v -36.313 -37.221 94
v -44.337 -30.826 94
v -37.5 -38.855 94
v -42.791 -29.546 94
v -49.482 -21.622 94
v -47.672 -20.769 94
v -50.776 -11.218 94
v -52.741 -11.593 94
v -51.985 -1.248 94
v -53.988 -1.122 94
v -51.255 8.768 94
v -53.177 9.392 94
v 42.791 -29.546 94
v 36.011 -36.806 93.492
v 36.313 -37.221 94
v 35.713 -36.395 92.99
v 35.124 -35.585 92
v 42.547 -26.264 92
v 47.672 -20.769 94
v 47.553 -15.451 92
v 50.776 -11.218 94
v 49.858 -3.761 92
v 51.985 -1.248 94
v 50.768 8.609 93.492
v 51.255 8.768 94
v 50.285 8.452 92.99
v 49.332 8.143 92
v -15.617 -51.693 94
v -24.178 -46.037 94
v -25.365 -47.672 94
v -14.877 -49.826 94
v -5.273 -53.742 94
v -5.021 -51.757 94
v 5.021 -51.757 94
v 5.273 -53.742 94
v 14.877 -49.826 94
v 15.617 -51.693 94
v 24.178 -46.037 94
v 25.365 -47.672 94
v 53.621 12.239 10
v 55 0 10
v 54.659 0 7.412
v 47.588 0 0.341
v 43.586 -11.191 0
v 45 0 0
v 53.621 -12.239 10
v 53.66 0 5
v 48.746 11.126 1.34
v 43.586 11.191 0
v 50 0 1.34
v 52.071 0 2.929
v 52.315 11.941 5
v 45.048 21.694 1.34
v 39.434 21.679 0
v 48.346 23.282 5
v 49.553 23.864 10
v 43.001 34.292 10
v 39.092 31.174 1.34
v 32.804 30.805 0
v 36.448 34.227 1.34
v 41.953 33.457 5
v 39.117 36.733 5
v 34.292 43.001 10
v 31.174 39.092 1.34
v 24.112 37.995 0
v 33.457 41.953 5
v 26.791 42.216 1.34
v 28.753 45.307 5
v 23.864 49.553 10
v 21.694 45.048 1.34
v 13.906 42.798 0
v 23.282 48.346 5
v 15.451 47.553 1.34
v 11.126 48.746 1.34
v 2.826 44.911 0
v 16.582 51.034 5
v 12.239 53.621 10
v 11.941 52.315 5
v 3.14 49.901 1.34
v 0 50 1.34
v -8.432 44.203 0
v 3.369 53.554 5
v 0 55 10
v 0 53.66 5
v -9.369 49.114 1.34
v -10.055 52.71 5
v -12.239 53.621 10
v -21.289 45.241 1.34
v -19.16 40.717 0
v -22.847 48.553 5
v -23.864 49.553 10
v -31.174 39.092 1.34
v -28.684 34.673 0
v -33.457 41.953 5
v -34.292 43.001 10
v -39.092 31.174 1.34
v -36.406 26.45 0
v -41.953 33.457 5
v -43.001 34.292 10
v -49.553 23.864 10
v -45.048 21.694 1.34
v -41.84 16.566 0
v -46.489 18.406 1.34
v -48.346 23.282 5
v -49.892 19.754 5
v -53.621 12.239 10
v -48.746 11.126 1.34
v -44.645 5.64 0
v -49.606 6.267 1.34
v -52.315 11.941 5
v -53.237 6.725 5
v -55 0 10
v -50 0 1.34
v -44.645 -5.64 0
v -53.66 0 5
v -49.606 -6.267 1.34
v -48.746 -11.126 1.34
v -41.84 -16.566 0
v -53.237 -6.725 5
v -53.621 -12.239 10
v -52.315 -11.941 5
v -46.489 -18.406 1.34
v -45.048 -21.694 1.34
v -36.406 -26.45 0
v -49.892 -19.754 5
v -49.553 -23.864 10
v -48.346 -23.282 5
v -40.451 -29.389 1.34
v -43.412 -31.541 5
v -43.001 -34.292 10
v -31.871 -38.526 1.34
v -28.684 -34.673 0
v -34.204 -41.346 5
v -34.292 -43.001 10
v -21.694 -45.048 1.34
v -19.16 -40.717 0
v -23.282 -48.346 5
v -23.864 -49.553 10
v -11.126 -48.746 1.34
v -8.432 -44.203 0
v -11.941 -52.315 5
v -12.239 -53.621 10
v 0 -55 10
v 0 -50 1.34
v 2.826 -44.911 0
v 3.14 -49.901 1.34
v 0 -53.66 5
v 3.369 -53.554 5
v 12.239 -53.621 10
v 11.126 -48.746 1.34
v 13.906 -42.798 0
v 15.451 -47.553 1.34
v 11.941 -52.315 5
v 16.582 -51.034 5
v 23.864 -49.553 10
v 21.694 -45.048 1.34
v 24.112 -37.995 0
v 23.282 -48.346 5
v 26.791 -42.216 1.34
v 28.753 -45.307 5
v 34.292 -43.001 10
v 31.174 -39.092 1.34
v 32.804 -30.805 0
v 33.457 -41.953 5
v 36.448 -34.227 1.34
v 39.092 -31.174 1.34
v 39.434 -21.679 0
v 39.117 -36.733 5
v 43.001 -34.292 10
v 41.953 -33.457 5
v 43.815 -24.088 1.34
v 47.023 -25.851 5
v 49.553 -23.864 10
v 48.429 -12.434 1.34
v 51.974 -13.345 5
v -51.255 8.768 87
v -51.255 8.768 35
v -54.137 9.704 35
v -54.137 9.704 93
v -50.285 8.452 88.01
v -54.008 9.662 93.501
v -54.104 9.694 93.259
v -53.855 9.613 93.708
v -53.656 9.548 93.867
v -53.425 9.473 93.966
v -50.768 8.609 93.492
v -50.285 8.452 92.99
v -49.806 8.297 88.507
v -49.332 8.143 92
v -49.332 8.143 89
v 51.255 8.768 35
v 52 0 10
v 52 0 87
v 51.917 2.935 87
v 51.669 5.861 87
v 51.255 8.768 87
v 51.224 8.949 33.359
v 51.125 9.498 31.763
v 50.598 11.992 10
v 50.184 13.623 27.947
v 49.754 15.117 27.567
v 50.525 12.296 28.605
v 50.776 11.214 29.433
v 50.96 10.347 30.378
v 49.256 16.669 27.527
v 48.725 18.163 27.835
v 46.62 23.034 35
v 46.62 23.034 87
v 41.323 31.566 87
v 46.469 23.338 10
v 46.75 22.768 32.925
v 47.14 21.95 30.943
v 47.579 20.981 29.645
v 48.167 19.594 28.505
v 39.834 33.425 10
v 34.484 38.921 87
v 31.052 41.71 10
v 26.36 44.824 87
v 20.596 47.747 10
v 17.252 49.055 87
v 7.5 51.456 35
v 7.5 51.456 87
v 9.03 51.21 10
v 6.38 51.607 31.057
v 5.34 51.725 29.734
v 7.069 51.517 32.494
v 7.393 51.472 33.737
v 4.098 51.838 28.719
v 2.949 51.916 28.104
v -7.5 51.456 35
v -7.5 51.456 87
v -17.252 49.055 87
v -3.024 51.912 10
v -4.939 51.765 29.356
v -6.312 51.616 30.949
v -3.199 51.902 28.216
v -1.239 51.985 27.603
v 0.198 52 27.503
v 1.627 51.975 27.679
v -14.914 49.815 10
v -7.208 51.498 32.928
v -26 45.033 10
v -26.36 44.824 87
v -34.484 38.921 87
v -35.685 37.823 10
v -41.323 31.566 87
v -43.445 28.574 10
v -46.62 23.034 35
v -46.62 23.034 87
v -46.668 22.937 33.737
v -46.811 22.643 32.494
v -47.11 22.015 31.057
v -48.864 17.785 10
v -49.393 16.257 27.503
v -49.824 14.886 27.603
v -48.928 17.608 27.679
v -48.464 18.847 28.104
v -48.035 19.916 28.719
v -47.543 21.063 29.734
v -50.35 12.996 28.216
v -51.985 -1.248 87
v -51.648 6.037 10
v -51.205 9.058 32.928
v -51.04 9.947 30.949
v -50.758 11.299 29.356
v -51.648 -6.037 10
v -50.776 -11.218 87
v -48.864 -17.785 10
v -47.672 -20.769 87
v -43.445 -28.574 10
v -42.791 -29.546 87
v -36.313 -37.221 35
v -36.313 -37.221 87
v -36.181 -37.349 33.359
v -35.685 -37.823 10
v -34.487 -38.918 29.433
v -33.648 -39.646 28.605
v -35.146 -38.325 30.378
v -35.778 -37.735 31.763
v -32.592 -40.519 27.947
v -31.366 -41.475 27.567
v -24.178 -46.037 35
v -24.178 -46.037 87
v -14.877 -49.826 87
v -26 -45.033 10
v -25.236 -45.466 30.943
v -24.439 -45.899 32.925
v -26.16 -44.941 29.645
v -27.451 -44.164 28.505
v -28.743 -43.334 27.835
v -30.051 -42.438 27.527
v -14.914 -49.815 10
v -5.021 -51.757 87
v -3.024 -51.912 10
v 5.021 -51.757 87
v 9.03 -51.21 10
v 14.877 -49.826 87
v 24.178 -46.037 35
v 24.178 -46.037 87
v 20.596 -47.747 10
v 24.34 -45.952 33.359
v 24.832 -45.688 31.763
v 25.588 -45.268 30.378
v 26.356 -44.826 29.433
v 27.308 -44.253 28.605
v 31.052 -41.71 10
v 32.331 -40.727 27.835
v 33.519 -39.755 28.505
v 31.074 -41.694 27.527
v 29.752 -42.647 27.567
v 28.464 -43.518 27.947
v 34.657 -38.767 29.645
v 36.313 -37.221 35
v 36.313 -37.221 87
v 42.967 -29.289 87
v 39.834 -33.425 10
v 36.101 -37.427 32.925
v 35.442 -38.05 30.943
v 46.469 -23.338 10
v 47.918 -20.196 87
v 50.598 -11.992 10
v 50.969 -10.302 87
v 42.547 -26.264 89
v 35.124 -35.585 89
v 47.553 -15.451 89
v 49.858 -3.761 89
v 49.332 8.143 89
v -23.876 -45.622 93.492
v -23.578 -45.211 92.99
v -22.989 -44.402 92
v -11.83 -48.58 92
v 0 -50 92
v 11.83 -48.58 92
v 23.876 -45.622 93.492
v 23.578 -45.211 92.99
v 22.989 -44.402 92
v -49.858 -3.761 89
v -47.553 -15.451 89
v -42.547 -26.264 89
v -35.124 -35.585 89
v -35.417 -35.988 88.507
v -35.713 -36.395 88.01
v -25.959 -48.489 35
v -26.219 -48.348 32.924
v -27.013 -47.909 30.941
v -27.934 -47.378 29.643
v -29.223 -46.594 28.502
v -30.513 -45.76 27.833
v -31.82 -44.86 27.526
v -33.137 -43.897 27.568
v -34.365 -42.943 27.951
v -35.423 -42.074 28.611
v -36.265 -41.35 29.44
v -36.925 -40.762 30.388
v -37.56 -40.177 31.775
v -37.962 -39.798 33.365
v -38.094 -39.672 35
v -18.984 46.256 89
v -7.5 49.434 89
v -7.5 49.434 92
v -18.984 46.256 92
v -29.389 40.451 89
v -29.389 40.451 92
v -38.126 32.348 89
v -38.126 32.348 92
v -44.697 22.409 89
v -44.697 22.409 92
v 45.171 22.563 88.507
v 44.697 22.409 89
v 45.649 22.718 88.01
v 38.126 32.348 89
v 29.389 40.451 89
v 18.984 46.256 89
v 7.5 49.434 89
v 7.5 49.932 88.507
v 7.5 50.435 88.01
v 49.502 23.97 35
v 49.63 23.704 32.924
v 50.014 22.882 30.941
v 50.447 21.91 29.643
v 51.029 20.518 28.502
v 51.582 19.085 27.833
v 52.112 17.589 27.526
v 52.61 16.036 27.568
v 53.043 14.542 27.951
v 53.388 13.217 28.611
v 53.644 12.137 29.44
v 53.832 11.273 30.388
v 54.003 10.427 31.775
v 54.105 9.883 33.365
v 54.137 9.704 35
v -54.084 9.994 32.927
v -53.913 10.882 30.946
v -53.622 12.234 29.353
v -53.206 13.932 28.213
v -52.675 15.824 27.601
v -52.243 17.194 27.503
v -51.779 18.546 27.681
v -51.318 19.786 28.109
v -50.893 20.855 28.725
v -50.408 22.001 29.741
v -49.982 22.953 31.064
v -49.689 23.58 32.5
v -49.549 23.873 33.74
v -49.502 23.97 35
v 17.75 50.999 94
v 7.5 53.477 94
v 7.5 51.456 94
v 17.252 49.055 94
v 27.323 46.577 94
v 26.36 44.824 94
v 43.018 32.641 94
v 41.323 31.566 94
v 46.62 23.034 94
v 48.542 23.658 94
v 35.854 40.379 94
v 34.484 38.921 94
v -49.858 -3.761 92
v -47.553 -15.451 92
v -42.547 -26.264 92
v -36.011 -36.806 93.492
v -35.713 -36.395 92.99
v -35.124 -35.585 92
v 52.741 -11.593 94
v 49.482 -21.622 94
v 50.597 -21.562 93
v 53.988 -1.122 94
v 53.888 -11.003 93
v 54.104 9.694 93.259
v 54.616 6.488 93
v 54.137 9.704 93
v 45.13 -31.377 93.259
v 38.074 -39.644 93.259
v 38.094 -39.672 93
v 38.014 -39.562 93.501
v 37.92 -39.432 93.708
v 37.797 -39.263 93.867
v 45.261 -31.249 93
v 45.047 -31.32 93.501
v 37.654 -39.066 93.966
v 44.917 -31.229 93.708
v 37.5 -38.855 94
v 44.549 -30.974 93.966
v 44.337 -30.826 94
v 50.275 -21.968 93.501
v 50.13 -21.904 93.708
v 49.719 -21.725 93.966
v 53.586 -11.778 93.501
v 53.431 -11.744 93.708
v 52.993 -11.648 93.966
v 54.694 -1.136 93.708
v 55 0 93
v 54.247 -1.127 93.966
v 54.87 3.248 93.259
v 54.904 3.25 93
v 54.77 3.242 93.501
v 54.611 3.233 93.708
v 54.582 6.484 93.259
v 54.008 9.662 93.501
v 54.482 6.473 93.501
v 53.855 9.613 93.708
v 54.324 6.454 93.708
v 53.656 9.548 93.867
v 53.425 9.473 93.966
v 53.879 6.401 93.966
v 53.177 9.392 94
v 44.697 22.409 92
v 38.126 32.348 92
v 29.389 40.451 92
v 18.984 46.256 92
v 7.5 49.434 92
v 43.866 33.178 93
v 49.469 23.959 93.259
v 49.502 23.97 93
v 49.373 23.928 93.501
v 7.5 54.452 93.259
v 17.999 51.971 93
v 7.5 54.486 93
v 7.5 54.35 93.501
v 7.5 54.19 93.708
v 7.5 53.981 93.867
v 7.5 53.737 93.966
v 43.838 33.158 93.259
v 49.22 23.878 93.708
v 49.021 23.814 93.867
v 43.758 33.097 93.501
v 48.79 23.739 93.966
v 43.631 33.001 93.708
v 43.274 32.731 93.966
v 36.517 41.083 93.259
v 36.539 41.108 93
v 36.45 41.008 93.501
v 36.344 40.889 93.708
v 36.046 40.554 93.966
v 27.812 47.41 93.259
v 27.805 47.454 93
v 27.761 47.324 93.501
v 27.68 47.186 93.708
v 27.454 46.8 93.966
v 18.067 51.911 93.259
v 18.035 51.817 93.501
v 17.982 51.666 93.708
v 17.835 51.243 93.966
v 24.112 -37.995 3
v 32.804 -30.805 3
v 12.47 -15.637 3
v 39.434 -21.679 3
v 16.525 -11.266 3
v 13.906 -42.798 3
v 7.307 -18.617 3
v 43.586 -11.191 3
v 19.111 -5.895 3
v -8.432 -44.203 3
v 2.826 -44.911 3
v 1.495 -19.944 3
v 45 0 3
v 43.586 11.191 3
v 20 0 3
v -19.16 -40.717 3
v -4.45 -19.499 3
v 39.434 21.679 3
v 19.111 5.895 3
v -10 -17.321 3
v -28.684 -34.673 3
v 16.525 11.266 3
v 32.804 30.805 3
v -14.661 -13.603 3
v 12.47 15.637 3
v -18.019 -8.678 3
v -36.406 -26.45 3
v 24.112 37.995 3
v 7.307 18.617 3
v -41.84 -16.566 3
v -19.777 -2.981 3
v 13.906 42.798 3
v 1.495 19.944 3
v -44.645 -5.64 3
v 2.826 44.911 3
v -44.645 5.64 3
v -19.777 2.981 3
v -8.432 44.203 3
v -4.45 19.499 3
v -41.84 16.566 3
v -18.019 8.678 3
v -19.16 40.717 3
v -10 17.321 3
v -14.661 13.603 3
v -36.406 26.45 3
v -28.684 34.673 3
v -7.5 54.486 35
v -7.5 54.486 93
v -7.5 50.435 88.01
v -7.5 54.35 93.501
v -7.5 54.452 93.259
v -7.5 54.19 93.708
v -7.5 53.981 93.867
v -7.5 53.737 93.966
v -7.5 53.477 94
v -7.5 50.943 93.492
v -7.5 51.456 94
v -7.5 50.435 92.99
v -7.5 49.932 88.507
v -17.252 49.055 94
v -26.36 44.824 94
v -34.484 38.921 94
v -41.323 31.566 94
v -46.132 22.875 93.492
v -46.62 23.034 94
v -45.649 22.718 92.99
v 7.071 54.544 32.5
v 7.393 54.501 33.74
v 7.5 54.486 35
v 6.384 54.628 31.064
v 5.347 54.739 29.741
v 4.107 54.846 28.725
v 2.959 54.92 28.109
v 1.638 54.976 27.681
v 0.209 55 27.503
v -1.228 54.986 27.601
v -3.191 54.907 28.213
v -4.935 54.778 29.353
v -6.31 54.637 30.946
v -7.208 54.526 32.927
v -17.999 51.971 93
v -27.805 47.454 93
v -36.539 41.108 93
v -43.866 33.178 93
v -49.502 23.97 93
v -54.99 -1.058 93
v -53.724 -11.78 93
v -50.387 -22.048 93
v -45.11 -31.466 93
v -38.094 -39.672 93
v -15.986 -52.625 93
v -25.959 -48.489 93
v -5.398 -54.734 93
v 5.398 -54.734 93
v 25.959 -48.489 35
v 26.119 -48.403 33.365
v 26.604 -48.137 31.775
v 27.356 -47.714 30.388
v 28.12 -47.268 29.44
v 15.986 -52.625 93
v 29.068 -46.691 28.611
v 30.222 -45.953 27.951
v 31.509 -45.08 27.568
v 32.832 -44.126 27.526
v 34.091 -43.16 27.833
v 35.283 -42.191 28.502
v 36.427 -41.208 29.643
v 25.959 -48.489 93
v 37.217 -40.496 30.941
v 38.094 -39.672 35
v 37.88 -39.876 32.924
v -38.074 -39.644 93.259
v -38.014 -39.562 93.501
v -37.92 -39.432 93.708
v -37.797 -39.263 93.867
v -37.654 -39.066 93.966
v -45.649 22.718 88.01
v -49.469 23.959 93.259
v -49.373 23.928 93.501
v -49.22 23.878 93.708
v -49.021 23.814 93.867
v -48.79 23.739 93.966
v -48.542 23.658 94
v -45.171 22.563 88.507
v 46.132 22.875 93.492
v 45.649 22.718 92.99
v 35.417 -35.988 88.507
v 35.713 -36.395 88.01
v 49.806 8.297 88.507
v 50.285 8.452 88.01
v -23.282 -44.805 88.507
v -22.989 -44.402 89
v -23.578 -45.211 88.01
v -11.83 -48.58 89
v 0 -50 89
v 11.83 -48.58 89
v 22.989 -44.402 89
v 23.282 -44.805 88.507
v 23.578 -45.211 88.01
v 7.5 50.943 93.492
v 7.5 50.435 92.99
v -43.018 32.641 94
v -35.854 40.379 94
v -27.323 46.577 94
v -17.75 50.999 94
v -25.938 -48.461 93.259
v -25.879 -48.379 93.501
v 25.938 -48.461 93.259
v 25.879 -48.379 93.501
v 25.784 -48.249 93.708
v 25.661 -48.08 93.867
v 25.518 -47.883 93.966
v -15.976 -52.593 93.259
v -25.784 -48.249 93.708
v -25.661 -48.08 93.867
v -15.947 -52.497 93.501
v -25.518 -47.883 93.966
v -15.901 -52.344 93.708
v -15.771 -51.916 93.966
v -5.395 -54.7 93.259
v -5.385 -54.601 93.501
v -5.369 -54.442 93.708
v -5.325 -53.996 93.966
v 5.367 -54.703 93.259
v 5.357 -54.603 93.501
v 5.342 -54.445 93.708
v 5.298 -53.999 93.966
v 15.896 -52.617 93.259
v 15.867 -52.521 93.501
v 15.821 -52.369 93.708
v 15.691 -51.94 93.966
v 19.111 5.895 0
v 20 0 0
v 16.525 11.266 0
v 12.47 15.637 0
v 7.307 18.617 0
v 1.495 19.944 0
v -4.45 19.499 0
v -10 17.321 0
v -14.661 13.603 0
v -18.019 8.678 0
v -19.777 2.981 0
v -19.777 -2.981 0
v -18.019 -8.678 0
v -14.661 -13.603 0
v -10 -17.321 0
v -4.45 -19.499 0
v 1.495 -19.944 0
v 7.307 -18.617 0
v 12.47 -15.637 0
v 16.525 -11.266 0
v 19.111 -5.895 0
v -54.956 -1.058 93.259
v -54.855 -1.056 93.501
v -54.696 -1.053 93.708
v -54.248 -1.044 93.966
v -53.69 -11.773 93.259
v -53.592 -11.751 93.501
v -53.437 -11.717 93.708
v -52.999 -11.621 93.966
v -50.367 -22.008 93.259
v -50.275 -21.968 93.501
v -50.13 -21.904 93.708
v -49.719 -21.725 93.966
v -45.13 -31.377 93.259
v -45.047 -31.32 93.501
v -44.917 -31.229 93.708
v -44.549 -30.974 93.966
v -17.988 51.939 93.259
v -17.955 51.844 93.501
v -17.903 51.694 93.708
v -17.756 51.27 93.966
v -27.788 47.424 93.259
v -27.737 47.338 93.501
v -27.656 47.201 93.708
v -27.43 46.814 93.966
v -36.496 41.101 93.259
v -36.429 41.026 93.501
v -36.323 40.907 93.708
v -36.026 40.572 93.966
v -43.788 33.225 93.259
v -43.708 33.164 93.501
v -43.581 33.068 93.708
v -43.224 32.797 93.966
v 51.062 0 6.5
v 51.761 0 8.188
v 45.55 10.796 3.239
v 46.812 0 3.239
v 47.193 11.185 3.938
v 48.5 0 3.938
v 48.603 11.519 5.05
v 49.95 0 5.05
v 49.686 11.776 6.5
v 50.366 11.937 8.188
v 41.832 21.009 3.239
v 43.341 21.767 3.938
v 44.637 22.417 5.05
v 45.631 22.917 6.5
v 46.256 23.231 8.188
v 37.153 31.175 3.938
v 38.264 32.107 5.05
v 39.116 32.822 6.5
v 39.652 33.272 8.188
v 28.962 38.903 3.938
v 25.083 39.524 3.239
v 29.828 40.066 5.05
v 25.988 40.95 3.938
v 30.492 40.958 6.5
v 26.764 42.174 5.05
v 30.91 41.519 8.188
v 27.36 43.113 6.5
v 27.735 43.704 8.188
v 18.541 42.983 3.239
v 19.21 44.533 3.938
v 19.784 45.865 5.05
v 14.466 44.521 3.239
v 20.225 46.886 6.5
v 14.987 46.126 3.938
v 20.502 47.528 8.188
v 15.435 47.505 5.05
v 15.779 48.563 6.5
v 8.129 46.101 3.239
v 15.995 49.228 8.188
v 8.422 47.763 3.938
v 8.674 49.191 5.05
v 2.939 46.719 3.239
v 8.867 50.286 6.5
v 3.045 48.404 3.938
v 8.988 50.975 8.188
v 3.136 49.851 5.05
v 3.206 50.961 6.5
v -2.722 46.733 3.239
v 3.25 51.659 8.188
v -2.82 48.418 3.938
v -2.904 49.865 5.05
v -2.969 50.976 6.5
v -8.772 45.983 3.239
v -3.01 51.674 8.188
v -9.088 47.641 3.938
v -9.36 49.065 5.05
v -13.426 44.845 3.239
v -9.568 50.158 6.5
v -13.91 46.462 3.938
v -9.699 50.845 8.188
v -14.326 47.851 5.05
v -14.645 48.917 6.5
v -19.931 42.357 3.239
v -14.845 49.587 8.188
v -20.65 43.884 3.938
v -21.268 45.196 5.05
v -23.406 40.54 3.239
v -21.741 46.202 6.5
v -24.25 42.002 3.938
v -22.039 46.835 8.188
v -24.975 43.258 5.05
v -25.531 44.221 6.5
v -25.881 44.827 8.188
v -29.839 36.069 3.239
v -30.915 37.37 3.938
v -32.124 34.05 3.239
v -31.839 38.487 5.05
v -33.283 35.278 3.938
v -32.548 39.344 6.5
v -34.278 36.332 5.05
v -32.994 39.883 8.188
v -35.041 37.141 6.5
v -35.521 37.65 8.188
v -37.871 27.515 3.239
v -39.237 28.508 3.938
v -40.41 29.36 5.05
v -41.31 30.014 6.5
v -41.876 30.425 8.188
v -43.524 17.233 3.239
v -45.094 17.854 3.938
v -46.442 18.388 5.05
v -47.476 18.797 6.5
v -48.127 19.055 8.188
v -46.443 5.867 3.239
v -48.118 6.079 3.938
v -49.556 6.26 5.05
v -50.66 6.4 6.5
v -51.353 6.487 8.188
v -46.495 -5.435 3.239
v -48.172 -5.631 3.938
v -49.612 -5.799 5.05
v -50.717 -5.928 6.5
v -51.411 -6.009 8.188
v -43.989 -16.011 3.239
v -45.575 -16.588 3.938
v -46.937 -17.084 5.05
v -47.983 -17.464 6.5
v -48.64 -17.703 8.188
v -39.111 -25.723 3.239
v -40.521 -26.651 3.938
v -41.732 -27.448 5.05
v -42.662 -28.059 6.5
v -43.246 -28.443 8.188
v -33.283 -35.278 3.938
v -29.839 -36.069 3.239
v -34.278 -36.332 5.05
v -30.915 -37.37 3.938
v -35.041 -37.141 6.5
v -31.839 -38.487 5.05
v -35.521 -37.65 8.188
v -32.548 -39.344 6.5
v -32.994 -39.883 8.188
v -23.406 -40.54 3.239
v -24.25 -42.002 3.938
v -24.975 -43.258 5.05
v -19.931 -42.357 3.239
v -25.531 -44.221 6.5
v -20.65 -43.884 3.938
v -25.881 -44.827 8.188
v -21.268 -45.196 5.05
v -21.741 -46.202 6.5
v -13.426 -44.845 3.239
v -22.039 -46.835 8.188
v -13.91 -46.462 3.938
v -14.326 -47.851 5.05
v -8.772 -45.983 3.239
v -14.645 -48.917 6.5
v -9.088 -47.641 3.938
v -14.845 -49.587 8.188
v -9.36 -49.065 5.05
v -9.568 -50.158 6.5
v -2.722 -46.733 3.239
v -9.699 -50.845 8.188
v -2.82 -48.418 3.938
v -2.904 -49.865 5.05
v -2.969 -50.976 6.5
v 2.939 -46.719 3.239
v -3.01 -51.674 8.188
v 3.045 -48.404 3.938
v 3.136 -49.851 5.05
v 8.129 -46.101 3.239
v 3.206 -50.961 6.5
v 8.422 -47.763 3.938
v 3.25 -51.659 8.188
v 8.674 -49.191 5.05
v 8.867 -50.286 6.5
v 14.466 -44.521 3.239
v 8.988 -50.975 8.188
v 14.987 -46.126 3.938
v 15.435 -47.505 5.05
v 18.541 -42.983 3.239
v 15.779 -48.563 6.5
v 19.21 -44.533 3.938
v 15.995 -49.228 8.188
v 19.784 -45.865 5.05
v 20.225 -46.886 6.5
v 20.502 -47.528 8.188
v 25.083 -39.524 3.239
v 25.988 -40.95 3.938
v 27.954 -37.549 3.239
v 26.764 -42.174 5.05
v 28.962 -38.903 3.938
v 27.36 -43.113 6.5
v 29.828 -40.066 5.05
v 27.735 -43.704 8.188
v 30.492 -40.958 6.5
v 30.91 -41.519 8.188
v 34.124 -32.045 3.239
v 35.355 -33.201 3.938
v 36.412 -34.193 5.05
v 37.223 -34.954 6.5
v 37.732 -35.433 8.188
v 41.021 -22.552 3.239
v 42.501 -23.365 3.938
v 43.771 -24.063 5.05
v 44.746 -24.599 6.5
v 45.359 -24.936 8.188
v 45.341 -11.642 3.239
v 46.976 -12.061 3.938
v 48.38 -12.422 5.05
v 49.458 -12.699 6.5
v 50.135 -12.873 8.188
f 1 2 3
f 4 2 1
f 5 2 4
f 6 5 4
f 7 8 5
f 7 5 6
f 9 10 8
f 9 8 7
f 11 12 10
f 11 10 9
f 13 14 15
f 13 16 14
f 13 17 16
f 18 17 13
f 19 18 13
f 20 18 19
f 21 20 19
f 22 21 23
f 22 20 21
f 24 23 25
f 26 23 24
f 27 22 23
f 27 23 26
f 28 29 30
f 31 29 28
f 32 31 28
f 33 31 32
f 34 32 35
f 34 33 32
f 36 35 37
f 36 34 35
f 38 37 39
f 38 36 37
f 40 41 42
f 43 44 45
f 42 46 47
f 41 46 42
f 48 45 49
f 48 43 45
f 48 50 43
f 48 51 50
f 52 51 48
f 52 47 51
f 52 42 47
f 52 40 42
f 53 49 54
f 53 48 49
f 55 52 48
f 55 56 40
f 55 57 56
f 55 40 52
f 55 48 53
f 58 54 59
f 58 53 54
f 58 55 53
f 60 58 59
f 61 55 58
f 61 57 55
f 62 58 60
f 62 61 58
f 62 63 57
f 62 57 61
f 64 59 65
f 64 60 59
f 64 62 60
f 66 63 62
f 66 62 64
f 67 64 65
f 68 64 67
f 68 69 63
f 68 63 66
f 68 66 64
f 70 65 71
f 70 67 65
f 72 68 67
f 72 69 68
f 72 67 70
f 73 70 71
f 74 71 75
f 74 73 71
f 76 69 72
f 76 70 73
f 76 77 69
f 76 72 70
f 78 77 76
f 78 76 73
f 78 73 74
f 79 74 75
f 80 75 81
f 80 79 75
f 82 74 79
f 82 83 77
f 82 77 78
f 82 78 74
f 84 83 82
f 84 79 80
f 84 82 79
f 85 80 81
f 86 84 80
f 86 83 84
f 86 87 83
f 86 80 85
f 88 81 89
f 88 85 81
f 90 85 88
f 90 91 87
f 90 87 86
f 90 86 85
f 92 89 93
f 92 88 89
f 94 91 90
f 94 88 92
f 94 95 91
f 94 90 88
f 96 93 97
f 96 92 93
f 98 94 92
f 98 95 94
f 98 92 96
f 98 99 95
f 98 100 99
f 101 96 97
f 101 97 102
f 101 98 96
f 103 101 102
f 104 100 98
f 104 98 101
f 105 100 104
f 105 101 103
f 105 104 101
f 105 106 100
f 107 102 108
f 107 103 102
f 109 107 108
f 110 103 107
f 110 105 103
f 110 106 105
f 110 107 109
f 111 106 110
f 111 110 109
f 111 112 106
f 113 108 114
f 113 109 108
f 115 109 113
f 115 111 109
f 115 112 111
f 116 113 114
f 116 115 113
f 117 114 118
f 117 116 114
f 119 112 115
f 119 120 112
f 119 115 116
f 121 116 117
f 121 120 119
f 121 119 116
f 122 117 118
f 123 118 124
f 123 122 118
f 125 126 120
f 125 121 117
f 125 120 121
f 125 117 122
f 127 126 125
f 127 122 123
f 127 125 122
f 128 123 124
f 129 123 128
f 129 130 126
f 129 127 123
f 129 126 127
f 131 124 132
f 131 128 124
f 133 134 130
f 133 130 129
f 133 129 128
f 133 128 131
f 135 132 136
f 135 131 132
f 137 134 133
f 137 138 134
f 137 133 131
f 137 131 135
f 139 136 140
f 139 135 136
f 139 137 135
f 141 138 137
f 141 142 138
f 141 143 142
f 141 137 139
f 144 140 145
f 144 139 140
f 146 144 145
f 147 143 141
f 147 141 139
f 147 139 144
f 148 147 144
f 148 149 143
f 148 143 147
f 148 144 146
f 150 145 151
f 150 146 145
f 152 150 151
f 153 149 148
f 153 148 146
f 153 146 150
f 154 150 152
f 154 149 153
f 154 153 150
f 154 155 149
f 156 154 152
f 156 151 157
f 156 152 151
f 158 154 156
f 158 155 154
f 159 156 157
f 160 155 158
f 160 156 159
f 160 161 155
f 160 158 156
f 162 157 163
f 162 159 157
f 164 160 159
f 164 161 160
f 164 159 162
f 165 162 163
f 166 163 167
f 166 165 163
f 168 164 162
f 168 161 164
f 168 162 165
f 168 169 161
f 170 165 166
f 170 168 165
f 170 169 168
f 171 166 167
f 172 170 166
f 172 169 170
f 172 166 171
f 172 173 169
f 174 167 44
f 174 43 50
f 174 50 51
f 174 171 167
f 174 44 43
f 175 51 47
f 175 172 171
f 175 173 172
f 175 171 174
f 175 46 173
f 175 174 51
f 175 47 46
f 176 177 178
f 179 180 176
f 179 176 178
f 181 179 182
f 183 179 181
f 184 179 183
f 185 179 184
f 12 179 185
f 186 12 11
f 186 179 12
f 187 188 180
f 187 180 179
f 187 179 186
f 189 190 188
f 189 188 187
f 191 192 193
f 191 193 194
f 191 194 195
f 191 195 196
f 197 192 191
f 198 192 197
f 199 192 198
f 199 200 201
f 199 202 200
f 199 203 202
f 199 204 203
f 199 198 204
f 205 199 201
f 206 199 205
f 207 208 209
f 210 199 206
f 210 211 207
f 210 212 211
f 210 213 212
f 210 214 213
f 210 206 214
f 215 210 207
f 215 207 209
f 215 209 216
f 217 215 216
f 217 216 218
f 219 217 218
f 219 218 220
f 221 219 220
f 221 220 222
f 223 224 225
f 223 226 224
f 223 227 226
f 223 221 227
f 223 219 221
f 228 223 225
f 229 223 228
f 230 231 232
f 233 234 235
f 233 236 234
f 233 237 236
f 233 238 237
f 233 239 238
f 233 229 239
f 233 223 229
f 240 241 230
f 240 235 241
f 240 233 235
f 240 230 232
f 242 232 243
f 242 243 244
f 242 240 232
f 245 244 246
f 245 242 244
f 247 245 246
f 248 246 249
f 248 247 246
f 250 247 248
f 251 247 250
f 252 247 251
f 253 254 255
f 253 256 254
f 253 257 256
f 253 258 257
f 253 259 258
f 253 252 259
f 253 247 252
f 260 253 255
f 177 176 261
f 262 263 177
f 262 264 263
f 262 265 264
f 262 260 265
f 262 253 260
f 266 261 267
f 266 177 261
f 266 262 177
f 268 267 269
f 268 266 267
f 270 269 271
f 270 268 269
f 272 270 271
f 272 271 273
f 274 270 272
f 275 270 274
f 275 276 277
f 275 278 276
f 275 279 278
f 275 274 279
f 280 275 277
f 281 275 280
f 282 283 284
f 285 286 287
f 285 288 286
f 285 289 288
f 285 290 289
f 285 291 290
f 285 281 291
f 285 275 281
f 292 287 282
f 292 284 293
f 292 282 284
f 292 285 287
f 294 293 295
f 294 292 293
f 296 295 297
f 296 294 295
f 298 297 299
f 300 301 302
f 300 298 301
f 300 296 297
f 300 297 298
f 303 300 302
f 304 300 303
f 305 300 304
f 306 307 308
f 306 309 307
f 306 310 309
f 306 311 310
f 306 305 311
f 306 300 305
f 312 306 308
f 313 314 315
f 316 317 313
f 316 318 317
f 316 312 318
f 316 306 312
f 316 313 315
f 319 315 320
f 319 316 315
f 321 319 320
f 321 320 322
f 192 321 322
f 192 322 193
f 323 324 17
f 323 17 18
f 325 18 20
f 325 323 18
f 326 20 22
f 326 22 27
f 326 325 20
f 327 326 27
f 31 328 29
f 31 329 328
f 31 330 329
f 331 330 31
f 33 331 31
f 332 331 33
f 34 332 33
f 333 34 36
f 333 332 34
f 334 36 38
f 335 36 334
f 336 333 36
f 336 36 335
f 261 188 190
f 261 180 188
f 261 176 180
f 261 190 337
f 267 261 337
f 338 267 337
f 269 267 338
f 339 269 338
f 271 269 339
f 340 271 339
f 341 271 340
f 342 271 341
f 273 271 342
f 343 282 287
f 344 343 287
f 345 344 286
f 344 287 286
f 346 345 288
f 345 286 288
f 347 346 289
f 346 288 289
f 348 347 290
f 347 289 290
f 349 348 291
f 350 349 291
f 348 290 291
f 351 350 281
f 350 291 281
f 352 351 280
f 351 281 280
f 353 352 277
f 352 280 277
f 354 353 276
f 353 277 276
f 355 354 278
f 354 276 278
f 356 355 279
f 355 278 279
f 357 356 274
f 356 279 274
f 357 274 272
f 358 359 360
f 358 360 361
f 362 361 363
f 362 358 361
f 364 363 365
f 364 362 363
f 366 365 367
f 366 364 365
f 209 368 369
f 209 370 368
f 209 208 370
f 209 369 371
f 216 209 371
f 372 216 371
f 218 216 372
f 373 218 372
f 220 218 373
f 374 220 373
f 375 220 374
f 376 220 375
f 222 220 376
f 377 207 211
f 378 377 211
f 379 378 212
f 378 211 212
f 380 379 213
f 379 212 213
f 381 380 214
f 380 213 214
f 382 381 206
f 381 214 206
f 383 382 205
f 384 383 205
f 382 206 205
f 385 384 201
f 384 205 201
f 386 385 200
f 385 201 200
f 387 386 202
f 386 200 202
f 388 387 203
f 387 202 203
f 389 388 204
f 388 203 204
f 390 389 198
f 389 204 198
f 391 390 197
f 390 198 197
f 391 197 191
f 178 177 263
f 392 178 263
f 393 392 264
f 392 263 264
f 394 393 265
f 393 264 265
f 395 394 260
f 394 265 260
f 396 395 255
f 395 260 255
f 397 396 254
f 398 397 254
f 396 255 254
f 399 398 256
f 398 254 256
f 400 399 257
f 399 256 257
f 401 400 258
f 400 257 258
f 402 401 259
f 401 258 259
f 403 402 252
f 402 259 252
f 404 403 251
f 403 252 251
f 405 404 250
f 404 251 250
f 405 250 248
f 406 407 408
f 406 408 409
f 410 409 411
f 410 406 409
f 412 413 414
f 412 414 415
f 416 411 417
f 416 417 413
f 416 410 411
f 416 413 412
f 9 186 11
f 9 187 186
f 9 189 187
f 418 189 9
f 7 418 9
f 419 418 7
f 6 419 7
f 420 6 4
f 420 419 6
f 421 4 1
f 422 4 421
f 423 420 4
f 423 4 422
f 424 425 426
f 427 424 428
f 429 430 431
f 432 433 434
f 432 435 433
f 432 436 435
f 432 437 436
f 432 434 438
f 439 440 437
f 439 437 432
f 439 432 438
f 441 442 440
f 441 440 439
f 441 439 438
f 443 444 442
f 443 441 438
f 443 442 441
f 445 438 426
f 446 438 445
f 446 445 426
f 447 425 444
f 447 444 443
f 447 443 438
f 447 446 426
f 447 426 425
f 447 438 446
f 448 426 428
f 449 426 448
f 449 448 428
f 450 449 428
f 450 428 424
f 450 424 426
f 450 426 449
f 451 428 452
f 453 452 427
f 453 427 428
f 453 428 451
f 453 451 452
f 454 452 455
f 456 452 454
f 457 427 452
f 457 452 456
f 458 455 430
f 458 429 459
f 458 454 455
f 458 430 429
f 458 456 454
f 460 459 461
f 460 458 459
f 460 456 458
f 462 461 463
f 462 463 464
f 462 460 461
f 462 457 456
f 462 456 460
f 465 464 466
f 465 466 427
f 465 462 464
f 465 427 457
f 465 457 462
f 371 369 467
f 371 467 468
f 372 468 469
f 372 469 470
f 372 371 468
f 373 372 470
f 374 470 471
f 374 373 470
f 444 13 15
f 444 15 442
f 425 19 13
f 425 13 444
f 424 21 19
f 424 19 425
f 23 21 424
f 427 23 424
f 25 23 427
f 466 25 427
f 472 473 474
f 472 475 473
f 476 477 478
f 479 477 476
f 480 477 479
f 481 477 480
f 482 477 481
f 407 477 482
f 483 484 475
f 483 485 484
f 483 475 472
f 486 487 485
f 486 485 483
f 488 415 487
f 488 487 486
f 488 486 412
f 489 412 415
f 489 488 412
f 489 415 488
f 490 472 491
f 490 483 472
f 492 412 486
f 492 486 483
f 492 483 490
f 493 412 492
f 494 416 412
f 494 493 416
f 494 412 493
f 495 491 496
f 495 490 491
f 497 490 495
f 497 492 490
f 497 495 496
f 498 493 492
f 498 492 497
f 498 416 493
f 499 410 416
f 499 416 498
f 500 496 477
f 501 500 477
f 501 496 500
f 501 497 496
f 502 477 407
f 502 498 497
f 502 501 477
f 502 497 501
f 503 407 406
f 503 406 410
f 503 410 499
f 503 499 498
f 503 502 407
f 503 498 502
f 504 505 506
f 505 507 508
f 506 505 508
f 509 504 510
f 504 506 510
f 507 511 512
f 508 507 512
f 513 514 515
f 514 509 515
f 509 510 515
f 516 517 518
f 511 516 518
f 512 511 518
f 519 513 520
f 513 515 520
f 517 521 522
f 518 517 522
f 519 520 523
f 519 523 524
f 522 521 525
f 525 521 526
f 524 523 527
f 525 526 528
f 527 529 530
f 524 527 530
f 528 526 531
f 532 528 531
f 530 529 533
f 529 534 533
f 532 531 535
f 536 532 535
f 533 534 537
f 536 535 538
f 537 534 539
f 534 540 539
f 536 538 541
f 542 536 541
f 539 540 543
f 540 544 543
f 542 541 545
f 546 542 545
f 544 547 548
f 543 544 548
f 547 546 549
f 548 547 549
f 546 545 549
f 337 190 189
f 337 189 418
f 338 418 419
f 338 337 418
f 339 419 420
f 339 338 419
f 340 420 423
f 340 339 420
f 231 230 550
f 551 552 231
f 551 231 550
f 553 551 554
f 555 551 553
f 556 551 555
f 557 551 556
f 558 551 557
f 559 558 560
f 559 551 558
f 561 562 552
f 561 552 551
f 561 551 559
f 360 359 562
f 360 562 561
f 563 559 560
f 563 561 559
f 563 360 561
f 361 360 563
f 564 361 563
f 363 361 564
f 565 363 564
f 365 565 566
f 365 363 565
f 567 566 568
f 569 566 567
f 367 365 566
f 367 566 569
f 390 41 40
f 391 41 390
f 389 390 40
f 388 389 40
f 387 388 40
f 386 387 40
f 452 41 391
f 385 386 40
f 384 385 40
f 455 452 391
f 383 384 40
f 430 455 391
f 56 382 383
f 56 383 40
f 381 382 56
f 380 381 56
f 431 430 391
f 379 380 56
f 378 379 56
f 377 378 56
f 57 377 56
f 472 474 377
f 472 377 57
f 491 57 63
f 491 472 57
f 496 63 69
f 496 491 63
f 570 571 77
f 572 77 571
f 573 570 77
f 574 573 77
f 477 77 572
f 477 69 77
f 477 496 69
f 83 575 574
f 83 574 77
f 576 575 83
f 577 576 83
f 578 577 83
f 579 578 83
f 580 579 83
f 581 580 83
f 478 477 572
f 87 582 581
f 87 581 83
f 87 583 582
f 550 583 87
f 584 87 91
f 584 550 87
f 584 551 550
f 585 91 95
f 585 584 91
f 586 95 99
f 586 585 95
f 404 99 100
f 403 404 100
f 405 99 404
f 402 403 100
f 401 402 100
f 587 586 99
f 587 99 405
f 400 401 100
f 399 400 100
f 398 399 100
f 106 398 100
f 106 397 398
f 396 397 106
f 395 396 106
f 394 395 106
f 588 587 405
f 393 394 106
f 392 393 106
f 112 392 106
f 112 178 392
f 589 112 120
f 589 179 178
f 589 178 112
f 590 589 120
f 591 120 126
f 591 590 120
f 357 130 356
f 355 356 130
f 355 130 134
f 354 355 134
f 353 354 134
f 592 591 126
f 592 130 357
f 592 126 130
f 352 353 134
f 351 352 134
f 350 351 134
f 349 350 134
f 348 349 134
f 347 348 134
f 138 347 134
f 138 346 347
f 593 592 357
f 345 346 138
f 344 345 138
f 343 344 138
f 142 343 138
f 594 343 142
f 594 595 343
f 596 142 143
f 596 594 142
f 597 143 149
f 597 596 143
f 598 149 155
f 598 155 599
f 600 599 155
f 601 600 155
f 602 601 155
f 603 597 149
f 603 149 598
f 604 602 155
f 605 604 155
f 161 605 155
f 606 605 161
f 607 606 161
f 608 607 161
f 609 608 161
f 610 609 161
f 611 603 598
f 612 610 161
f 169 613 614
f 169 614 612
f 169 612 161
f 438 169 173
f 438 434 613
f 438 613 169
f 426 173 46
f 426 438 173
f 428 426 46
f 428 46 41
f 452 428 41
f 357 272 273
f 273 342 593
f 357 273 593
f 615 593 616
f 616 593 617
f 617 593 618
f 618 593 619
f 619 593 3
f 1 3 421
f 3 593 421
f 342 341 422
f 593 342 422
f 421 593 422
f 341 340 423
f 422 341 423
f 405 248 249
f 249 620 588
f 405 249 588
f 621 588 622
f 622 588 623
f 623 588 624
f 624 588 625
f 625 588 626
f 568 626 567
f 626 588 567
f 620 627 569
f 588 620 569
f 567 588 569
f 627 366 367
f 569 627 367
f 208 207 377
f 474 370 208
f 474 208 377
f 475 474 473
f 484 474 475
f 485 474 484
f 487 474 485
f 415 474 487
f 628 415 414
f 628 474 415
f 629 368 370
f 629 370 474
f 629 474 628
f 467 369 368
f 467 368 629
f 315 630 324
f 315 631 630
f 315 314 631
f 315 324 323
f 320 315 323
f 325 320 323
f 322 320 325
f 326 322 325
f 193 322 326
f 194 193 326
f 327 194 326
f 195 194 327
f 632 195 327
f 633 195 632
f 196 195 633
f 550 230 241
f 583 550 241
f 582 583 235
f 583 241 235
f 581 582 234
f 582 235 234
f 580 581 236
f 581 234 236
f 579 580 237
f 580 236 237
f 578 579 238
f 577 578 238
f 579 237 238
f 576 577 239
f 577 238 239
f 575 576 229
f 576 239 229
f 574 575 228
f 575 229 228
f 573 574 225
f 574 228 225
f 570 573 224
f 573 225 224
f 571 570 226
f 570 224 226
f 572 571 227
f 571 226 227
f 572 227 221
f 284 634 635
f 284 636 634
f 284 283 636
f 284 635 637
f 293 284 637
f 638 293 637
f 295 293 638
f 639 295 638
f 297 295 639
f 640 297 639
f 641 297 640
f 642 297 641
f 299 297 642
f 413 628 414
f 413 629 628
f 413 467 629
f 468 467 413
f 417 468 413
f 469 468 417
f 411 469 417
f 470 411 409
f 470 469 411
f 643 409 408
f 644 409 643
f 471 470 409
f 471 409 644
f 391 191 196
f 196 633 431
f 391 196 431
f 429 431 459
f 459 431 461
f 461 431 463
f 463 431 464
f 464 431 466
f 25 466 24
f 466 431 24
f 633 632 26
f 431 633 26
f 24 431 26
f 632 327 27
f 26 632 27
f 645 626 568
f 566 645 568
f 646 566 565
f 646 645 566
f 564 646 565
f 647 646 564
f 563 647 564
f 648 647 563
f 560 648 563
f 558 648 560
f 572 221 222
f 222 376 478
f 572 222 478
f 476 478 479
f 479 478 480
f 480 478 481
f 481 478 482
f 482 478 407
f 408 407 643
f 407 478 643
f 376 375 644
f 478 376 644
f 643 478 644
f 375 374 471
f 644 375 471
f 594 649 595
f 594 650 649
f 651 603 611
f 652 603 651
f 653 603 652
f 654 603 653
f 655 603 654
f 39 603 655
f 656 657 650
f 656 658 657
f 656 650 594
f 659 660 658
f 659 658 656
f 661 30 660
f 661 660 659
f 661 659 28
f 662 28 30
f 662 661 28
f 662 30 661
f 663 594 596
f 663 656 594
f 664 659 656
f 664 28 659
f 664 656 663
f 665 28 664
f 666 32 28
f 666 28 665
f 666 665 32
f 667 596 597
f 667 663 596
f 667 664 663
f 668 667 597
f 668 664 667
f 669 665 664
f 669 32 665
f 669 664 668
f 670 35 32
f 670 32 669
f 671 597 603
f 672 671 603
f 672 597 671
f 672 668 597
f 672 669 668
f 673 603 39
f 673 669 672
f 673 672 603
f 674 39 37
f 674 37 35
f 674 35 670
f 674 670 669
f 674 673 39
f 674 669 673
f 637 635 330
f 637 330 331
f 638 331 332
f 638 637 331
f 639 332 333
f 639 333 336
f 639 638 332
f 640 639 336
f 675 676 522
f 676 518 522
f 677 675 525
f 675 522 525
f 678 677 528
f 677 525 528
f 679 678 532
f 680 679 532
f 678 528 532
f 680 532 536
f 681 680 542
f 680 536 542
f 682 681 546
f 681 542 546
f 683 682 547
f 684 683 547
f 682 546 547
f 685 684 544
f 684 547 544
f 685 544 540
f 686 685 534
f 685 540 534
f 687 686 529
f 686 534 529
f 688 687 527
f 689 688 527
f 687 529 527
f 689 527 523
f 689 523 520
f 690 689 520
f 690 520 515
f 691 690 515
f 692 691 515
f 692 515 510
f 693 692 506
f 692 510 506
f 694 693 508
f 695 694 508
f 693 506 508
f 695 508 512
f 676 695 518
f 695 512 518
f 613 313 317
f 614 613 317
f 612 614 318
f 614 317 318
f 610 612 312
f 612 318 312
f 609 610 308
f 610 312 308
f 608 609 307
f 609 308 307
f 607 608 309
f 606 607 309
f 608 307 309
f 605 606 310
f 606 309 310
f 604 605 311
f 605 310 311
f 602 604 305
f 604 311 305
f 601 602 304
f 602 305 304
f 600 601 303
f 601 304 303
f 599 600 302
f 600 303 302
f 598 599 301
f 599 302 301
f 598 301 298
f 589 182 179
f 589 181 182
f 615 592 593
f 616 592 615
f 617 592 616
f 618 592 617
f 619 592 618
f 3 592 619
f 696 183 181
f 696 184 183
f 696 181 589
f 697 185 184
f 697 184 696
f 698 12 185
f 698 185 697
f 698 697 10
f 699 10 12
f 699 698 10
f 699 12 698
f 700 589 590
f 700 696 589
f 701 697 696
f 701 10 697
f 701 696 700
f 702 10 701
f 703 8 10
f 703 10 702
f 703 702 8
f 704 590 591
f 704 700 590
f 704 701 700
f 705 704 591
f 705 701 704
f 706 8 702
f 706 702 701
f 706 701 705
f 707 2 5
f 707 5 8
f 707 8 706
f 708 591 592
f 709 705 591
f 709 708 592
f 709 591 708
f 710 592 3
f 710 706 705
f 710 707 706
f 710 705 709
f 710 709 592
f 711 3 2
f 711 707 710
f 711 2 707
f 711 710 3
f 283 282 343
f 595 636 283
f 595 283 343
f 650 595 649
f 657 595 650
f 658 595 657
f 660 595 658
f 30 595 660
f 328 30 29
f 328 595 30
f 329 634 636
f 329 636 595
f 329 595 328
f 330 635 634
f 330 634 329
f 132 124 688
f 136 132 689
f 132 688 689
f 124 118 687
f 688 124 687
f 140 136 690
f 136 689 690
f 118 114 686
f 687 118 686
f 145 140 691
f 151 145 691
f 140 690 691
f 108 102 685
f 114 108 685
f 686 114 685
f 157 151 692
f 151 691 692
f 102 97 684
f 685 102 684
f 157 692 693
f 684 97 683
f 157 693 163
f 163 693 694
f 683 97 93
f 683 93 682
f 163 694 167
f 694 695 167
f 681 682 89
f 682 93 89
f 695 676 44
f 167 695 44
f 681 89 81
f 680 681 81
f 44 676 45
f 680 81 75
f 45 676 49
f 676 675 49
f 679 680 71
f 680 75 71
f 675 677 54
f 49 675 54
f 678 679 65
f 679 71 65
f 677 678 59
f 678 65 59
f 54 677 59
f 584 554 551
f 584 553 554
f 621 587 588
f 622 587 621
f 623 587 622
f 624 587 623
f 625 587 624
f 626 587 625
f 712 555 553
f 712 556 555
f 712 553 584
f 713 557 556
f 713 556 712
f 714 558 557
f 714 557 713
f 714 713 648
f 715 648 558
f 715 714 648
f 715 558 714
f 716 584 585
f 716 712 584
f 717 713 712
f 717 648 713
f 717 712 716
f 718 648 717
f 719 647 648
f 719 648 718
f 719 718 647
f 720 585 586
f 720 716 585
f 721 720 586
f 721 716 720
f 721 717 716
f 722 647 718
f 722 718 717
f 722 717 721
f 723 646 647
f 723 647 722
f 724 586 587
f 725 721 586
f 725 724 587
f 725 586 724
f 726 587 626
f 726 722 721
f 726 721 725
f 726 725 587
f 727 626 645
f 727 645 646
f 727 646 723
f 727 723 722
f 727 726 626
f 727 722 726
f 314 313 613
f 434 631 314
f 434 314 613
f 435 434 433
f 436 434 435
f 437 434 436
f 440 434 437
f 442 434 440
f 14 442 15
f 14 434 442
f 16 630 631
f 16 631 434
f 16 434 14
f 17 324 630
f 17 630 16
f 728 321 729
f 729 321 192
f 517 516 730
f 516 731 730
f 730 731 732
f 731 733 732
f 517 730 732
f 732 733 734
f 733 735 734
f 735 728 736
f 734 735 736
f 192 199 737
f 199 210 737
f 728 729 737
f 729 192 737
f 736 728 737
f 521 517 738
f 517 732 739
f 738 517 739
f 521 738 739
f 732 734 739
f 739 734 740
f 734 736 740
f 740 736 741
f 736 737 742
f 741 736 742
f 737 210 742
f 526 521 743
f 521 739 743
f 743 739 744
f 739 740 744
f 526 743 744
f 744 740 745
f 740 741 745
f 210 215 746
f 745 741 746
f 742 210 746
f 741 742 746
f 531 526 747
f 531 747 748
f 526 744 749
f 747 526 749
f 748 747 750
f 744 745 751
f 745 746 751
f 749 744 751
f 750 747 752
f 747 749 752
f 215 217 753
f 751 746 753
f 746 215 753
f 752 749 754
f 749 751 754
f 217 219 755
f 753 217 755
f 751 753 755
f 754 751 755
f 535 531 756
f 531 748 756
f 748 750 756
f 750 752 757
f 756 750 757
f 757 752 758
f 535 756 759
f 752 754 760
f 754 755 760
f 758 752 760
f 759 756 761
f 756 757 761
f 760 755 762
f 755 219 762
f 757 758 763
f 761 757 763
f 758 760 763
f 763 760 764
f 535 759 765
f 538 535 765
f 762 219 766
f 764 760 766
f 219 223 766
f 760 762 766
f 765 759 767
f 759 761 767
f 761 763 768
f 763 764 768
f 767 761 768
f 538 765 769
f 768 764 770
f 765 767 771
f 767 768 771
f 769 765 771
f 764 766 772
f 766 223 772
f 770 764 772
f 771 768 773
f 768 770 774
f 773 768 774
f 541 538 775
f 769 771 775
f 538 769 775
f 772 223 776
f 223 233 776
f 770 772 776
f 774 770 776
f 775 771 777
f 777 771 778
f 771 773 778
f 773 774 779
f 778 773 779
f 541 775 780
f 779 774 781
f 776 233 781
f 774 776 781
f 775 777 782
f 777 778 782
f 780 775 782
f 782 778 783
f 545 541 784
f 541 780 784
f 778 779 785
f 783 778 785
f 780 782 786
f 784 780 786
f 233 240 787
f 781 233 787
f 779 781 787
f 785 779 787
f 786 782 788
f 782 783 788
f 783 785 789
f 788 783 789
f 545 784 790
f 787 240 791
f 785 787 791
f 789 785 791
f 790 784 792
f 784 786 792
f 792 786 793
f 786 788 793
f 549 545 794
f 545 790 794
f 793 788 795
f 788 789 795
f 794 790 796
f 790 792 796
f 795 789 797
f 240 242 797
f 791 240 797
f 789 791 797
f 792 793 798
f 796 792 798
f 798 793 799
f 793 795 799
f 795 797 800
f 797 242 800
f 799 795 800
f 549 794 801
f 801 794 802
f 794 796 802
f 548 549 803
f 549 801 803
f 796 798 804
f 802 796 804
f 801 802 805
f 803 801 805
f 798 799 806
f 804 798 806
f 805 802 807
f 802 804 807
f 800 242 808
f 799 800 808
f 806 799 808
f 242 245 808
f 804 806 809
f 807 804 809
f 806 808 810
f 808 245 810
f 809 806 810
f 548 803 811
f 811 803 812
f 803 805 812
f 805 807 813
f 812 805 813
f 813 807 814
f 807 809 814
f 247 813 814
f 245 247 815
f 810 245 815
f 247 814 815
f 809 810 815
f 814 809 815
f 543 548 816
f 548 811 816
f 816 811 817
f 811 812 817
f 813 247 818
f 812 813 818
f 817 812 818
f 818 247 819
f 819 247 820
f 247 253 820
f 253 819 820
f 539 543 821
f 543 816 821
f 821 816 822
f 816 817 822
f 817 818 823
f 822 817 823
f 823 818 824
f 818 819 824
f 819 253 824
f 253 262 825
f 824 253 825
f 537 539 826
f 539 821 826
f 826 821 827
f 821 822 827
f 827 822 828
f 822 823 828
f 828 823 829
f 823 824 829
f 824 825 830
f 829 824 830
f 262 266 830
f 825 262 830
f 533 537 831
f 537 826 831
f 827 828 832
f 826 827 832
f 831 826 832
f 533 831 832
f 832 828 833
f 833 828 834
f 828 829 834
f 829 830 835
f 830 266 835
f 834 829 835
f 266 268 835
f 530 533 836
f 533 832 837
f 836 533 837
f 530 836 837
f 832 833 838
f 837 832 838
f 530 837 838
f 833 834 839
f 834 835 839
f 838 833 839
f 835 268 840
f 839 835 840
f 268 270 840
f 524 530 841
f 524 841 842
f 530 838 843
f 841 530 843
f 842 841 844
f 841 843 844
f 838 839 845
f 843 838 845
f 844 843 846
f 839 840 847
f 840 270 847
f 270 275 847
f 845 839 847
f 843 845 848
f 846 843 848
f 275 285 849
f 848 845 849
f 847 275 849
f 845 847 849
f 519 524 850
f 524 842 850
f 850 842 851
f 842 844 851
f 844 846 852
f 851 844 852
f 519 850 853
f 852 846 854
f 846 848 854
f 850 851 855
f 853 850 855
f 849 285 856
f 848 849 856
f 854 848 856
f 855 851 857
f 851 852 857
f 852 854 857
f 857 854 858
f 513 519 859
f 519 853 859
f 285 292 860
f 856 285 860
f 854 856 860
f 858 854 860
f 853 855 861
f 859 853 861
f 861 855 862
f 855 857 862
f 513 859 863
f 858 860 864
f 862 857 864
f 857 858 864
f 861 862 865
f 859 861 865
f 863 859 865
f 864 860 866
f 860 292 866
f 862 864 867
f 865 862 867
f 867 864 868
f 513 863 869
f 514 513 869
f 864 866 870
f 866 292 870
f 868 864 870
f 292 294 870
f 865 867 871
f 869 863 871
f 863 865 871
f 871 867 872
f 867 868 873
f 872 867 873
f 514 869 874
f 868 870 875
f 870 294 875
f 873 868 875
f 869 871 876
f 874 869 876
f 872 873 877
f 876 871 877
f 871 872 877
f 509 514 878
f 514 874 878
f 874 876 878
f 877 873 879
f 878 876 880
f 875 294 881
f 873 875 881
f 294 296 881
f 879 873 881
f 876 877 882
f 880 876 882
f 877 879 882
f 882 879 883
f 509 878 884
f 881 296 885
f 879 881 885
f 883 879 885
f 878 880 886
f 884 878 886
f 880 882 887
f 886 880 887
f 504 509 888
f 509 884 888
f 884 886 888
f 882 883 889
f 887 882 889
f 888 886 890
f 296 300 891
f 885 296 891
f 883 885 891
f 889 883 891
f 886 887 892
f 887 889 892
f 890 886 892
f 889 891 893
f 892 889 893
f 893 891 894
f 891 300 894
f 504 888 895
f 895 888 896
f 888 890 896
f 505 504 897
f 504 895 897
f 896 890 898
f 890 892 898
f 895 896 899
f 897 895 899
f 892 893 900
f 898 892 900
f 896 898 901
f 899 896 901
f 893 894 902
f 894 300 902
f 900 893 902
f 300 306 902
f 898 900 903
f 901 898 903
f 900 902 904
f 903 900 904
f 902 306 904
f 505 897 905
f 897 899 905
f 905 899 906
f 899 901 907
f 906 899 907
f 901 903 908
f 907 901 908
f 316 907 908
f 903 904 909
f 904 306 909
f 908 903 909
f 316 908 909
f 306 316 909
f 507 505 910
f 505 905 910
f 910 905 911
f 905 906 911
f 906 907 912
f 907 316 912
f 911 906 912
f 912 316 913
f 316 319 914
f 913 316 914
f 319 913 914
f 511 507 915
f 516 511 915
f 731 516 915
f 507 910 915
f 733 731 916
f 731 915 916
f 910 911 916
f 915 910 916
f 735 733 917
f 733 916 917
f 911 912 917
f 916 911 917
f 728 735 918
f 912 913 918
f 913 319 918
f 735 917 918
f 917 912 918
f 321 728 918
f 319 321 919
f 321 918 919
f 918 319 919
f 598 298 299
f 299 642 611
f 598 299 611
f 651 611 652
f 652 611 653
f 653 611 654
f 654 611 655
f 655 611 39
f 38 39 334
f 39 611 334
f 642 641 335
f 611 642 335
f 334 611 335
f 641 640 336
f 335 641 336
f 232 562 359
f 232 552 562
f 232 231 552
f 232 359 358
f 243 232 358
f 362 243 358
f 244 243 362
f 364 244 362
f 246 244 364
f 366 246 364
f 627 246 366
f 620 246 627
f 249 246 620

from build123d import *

# Parameters (mm, degrees)
POCKET_DEPTH       = 418.517162
POLARPATTERN_COUNT = 5


with BuildPart() as part:
    # Sketch → Revolution (revolve)
    with BuildSketch(Plane.XZ):
        with BuildLine():
            ThreePointArc((45, 0), (52.071068, 2.928932), (55, 10))
            Line((55, 10), (55, 93))
            ThreePointArc((55, 93), (54.707107, 93.707107), (54, 94))
            Line((54, 94), (52, 94))
            Line((52, 94), (50, 92))
            Line((50, 92), (50, 89))
            Line((50, 89), (52, 87))
            Line((52, 87), (52, 10))
            ThreePointArc((45, 3), (49.949747, 5.050253), (52, 10))
            Line((20, 3), (45, 3))
            Line((20, 0), (20, 3))
            Line((45, 0), (20, 0))
        make_face()
    revolve(axis=Axis((0, 0, 0), (0, 0, 1)))

    # Sketch001 → Pocket (cut, through all)
    with BuildSketch(Plane.XZ):
        with BuildLine():
            ThreePointArc((-7.5, 35), (0, 27.5), (7.5, 35))
            Line((7.5, 35), (7.5, 159.742664))
            ThreePointArc((7.5, 159.742664), (0, 167.242664), (-7.5, 159.742664))
            Line((-7.5, 35), (-7.5, 159.742664))
        make_face()
    pocket = extrude(amount=-POCKET_DEPTH, mode=Mode.SUBTRACT)

    # PolarPattern: Pocket ×5 about axis
    polarpattern_axis = Axis((0, 0, 0), (0, 0, 1))
    for i in range(1, POLARPATTERN_COUNT):
        add(pocket.rotate(polarpattern_axis, i * 360 / POLARPATTERN_COUNT), mode=Mode.SUBTRACT)


solid = part.part
